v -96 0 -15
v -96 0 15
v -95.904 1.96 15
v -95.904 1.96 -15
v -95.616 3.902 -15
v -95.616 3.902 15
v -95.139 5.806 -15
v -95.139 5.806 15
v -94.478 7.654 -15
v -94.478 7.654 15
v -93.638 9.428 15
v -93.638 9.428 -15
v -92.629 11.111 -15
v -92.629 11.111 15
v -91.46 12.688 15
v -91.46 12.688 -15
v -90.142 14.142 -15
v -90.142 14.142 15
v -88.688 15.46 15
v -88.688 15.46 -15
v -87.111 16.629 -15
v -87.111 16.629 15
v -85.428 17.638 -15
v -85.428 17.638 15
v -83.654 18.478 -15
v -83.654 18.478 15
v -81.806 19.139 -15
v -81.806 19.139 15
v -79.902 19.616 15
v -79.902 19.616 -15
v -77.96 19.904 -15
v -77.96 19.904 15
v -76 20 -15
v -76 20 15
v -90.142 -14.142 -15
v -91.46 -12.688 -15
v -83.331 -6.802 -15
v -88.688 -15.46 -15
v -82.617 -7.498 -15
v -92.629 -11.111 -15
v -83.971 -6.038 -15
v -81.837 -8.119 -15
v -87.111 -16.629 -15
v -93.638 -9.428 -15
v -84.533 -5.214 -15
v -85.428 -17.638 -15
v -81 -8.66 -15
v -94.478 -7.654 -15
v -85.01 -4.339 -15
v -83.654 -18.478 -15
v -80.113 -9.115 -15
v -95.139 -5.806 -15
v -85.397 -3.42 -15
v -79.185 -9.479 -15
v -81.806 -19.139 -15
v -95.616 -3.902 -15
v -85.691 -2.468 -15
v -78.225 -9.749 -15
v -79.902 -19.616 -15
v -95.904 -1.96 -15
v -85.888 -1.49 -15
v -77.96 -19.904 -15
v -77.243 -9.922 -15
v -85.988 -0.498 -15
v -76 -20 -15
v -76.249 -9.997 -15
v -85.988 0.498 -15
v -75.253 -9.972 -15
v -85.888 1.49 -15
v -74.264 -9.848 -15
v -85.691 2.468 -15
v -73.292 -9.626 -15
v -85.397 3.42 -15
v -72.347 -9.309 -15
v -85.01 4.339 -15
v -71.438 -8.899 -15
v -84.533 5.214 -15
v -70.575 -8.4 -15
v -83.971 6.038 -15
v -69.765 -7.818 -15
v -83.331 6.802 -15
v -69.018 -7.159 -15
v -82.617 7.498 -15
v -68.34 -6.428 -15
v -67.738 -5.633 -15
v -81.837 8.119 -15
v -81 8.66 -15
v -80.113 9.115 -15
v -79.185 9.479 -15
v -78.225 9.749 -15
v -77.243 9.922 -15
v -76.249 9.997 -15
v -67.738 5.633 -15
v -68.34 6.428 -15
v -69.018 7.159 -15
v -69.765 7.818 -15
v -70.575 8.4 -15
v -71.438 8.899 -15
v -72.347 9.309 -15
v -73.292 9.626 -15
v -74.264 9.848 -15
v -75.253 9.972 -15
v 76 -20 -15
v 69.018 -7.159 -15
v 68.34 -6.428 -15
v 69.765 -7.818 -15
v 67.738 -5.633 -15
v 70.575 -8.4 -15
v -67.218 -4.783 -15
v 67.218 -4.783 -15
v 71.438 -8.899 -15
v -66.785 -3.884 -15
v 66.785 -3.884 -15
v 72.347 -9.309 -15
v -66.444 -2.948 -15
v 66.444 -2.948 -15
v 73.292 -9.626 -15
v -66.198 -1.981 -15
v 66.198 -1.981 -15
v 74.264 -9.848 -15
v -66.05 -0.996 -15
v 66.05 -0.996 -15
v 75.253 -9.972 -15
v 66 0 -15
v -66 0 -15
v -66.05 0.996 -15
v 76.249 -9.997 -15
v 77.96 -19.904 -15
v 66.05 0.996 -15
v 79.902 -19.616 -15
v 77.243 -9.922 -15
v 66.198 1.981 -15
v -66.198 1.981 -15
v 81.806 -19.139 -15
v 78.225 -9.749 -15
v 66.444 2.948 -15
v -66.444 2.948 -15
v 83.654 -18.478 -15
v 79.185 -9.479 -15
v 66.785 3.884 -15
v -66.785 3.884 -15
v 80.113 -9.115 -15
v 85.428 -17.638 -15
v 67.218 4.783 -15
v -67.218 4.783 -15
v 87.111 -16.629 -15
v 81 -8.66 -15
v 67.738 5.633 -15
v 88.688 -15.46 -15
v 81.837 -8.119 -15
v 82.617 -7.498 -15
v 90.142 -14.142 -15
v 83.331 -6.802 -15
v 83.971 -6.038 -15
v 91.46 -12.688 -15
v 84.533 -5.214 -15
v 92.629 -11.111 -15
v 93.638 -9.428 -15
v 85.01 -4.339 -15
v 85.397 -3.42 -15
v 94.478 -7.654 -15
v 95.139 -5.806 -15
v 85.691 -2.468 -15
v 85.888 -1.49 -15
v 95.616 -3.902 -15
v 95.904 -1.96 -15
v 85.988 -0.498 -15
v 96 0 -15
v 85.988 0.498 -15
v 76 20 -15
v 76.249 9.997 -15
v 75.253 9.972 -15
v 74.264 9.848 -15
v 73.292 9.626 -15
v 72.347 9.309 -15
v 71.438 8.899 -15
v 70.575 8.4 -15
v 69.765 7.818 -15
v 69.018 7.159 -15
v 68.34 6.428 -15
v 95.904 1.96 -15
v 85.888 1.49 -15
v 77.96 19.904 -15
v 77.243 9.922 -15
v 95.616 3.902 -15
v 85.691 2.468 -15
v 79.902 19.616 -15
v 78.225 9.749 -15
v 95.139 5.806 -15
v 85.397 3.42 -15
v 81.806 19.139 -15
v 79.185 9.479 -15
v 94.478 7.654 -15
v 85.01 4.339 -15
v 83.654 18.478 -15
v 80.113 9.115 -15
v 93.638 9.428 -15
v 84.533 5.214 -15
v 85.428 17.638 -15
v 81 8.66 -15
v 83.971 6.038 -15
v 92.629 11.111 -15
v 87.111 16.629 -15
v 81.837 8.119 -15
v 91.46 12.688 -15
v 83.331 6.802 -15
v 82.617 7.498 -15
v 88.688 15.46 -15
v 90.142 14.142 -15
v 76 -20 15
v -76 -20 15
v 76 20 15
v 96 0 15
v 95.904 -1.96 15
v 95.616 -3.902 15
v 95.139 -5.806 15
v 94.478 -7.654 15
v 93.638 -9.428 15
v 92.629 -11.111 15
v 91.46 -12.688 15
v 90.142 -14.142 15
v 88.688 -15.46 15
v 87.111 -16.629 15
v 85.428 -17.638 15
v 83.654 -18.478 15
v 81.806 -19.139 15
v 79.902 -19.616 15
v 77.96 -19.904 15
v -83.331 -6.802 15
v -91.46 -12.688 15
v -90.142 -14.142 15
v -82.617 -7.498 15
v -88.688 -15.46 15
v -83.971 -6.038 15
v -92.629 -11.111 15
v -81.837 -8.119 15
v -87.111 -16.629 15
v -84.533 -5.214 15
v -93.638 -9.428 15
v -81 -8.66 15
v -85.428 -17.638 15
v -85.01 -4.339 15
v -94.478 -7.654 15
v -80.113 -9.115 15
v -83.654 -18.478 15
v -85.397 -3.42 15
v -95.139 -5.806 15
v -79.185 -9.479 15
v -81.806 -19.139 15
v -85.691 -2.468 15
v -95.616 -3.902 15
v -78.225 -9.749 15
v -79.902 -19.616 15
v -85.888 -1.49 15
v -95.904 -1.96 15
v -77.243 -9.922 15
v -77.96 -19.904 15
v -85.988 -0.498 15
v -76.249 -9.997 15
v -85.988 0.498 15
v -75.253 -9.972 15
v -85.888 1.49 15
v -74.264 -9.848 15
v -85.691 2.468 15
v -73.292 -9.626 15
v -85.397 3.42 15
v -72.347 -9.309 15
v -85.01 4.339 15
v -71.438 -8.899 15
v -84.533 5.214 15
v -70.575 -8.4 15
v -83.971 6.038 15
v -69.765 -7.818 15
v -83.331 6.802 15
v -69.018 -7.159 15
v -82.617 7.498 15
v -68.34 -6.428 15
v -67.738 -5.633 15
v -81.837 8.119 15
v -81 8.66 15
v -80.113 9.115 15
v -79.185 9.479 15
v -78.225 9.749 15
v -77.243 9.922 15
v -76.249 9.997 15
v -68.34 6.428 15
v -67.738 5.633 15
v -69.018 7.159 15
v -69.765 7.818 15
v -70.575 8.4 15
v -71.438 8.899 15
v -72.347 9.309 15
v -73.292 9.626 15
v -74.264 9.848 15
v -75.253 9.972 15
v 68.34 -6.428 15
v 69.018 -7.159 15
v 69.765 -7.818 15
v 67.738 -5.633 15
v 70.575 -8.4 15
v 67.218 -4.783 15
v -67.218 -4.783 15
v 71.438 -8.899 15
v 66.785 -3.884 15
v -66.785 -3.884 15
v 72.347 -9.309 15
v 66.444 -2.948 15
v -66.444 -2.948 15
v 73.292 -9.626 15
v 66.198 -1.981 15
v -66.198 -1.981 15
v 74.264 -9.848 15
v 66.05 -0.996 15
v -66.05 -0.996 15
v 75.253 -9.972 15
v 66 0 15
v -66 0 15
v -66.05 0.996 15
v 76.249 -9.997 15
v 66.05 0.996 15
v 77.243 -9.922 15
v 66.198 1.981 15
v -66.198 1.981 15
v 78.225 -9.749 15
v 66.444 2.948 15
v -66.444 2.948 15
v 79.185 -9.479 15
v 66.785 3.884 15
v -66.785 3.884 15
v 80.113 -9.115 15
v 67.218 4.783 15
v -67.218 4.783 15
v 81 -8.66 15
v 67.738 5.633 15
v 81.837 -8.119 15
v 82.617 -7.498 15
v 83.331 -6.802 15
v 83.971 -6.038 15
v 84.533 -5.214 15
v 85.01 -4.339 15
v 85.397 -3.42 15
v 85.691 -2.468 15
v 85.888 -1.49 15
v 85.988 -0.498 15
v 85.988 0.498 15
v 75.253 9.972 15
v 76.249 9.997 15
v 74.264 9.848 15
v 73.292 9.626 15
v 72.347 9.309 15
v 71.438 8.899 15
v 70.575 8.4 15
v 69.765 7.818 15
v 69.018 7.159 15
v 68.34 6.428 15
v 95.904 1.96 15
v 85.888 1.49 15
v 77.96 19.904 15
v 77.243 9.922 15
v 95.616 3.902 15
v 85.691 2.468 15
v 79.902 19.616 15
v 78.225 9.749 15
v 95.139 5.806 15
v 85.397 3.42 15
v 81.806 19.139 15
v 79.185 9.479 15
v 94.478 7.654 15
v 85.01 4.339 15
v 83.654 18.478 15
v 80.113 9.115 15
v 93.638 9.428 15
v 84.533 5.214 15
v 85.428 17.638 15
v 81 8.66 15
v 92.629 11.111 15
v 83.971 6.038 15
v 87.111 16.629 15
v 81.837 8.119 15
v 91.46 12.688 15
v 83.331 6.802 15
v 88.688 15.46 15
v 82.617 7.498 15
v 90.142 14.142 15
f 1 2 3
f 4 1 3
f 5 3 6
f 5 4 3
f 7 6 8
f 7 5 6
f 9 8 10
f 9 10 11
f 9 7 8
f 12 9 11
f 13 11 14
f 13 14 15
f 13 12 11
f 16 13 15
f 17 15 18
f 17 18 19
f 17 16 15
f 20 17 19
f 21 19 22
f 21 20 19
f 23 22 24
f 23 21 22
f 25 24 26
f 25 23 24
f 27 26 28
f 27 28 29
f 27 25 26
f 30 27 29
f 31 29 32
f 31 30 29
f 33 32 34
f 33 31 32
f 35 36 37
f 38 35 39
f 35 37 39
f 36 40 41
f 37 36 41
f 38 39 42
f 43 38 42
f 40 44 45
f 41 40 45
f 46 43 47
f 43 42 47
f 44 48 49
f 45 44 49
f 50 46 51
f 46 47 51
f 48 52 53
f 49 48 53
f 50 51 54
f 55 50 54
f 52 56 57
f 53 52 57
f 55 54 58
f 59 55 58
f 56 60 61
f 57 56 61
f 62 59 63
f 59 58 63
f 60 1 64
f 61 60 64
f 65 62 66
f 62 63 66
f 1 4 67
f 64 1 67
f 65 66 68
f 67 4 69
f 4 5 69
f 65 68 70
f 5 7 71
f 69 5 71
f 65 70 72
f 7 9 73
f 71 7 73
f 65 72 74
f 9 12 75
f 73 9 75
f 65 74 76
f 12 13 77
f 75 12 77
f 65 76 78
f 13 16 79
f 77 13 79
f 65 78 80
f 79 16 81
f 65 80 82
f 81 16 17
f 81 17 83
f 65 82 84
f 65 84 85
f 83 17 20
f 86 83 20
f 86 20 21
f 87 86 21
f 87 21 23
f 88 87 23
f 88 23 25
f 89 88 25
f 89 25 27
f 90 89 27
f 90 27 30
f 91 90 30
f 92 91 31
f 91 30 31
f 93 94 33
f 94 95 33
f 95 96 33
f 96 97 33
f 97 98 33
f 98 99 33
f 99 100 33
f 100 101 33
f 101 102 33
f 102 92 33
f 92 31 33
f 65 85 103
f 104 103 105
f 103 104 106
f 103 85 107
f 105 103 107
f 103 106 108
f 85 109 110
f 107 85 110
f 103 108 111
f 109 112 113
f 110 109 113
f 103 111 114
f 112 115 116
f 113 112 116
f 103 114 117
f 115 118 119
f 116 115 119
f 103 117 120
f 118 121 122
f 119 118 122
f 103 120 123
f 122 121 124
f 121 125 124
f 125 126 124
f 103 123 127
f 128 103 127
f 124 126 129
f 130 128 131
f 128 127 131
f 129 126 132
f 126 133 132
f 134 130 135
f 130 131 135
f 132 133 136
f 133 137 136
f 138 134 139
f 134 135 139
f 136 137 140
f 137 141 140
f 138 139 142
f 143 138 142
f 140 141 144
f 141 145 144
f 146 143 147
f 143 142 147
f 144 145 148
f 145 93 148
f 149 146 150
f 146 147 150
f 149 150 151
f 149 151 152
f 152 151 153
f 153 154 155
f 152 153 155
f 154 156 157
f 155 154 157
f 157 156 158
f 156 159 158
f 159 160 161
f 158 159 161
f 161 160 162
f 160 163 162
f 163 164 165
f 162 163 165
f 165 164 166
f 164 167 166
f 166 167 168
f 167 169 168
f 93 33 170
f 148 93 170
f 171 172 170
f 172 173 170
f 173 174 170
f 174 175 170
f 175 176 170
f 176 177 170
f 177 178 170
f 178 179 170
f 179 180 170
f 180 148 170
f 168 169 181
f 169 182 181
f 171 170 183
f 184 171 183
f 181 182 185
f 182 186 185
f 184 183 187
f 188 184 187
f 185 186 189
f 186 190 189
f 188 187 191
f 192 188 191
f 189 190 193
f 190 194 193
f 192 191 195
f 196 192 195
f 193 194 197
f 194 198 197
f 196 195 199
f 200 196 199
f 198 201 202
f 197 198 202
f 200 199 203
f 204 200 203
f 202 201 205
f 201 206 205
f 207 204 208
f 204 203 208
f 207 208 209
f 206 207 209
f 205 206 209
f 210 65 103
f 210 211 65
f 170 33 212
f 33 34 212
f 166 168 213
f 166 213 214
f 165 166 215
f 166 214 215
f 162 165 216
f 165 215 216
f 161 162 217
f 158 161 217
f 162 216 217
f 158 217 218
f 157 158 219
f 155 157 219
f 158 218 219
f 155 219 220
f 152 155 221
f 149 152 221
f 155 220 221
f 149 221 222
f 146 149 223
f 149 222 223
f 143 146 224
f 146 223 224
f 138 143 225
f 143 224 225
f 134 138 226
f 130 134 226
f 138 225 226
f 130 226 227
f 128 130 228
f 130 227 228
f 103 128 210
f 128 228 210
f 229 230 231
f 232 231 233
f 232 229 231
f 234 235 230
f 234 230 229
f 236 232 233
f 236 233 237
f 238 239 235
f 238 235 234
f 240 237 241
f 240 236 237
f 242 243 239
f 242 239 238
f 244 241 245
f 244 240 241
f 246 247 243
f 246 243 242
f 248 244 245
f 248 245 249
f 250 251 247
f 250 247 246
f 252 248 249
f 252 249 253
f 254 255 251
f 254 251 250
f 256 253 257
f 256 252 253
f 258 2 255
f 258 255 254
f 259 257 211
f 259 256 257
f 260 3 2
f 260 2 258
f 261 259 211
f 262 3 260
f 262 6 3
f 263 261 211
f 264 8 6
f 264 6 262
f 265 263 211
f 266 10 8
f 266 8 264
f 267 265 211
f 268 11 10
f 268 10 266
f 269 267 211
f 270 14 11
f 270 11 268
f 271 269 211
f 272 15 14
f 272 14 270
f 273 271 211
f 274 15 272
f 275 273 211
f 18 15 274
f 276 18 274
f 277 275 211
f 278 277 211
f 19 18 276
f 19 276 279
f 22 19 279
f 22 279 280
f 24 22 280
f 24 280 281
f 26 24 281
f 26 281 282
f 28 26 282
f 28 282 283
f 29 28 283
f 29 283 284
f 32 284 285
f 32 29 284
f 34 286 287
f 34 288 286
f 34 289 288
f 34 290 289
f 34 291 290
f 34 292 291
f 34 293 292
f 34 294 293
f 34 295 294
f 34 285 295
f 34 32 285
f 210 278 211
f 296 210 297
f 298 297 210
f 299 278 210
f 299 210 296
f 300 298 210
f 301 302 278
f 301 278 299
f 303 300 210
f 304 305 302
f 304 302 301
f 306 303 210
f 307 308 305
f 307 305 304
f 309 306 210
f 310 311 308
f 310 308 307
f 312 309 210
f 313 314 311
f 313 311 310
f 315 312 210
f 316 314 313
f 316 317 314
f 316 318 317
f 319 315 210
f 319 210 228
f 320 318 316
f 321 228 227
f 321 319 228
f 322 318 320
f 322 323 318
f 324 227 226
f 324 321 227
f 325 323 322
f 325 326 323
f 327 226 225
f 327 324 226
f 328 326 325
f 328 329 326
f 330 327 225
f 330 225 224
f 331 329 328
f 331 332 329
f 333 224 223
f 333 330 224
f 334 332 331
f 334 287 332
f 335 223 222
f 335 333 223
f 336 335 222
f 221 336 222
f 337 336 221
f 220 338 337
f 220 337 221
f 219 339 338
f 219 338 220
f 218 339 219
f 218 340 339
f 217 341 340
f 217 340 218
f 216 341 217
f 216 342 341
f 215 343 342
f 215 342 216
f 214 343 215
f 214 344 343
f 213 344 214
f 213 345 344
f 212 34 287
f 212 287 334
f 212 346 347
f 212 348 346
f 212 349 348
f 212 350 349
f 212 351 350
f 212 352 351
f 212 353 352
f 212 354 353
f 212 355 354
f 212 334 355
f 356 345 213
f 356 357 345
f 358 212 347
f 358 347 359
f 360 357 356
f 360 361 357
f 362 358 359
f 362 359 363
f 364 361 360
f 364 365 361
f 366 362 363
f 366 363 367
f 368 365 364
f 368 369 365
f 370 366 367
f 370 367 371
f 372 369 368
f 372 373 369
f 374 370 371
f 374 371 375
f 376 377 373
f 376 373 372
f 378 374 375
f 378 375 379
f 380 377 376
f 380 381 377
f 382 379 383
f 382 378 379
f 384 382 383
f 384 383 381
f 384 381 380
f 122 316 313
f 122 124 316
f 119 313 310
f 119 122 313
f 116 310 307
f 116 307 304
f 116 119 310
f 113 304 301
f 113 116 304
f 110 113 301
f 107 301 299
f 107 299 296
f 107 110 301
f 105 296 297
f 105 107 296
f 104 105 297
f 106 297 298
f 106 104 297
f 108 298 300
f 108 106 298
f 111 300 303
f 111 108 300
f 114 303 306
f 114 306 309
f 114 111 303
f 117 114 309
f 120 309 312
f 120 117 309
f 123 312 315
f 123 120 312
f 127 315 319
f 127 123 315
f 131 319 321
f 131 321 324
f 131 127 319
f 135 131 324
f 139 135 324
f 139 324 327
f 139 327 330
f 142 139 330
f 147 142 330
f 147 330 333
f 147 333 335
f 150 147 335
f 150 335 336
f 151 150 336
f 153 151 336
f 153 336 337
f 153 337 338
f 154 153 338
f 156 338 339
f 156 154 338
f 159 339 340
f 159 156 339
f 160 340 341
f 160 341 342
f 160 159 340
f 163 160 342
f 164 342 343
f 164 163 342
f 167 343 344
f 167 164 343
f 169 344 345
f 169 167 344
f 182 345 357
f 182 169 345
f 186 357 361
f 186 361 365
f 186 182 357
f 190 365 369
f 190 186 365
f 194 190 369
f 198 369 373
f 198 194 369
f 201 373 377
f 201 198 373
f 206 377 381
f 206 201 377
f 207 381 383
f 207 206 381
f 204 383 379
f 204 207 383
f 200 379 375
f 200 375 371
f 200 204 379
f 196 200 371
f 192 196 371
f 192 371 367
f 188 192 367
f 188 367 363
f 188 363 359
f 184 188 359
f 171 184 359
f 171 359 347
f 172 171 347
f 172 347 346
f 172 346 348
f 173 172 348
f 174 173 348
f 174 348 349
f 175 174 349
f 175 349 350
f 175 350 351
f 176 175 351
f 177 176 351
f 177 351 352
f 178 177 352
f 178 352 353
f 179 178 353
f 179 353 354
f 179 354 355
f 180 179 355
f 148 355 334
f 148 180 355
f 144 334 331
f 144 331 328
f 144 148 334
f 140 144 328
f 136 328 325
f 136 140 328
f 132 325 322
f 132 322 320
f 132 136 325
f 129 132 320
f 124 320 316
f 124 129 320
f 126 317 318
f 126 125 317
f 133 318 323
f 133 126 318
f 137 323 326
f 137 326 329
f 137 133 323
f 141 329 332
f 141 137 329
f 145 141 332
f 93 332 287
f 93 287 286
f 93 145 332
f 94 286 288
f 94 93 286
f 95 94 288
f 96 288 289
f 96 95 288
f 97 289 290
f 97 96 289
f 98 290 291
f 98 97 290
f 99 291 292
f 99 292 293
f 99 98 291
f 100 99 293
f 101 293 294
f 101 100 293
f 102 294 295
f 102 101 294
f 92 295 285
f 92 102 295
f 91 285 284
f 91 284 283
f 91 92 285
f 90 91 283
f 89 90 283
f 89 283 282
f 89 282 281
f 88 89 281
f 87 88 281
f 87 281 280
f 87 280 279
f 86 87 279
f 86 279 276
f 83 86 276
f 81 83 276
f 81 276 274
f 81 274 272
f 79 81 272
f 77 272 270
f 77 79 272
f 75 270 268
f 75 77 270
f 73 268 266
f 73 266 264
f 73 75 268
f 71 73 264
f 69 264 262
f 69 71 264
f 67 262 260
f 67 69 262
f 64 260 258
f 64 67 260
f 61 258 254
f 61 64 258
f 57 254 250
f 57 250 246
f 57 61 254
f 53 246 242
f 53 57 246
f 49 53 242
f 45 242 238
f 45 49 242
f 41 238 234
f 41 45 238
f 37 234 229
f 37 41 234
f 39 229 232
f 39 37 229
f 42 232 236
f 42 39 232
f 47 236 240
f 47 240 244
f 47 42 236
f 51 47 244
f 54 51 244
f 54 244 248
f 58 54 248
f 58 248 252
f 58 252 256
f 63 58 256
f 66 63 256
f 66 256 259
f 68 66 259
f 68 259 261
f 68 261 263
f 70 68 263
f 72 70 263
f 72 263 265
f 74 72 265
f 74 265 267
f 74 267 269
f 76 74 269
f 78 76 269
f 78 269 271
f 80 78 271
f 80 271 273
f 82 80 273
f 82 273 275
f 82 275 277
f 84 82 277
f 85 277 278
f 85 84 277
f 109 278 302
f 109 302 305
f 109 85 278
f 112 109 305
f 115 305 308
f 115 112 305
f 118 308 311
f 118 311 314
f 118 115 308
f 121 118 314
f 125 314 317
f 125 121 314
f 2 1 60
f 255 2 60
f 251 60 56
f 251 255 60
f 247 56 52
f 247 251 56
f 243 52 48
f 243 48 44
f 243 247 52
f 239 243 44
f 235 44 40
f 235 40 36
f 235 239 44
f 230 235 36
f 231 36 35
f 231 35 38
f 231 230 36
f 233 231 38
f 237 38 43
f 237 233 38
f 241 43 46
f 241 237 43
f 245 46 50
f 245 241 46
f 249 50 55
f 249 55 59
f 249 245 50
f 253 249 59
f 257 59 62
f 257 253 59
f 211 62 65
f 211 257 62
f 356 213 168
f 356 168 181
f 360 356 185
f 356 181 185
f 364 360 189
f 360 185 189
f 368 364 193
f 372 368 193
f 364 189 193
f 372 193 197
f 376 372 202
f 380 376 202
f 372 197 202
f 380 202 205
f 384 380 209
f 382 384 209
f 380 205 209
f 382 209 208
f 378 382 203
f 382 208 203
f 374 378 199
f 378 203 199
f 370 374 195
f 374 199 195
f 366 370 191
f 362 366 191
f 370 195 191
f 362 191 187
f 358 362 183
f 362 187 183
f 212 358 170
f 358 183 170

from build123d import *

# Parameters (mm, degrees)
IZIM1_W                     = 192
IZIM1_H                     = 40
IZIM1_R                     = 10
Y_KSEKLIK_EKSTR_ZYON1_DEPTH = 15
RADYUS1_R                   = 20


with BuildPart() as part:
    # Çizim1 → Yükseklik-Ekstrüzyon1 (new, symmetric)
    with BuildSketch(Plane.XY):
        Rectangle(IZIM1_W, IZIM1_H)
        with Locations((-76, 0)):
            Circle(IZIM1_R, mode=Mode.SUBTRACT)
        with Locations(Location((76, 0, 0), (0, 0, 180))):
            Circle(IZIM1_R, mode=Mode.SUBTRACT)
    extrude(amount=Y_KSEKLIK_EKSTR_ZYON1_DEPTH, both=True)

    # Radyus1
    radyus1_edges = [part.edges().sort_by_distance(p)[0] for p in [
        (-96, -20, 0),
        (-96, 20, 0),
        (96, -20, 0),
        (96, 20, 0),
    ]]
    fillet(radyus1_edges, radius=RADYUS1_R - 0.0001)  # a hair under: the kernel refuses the full size


solid = part.part
